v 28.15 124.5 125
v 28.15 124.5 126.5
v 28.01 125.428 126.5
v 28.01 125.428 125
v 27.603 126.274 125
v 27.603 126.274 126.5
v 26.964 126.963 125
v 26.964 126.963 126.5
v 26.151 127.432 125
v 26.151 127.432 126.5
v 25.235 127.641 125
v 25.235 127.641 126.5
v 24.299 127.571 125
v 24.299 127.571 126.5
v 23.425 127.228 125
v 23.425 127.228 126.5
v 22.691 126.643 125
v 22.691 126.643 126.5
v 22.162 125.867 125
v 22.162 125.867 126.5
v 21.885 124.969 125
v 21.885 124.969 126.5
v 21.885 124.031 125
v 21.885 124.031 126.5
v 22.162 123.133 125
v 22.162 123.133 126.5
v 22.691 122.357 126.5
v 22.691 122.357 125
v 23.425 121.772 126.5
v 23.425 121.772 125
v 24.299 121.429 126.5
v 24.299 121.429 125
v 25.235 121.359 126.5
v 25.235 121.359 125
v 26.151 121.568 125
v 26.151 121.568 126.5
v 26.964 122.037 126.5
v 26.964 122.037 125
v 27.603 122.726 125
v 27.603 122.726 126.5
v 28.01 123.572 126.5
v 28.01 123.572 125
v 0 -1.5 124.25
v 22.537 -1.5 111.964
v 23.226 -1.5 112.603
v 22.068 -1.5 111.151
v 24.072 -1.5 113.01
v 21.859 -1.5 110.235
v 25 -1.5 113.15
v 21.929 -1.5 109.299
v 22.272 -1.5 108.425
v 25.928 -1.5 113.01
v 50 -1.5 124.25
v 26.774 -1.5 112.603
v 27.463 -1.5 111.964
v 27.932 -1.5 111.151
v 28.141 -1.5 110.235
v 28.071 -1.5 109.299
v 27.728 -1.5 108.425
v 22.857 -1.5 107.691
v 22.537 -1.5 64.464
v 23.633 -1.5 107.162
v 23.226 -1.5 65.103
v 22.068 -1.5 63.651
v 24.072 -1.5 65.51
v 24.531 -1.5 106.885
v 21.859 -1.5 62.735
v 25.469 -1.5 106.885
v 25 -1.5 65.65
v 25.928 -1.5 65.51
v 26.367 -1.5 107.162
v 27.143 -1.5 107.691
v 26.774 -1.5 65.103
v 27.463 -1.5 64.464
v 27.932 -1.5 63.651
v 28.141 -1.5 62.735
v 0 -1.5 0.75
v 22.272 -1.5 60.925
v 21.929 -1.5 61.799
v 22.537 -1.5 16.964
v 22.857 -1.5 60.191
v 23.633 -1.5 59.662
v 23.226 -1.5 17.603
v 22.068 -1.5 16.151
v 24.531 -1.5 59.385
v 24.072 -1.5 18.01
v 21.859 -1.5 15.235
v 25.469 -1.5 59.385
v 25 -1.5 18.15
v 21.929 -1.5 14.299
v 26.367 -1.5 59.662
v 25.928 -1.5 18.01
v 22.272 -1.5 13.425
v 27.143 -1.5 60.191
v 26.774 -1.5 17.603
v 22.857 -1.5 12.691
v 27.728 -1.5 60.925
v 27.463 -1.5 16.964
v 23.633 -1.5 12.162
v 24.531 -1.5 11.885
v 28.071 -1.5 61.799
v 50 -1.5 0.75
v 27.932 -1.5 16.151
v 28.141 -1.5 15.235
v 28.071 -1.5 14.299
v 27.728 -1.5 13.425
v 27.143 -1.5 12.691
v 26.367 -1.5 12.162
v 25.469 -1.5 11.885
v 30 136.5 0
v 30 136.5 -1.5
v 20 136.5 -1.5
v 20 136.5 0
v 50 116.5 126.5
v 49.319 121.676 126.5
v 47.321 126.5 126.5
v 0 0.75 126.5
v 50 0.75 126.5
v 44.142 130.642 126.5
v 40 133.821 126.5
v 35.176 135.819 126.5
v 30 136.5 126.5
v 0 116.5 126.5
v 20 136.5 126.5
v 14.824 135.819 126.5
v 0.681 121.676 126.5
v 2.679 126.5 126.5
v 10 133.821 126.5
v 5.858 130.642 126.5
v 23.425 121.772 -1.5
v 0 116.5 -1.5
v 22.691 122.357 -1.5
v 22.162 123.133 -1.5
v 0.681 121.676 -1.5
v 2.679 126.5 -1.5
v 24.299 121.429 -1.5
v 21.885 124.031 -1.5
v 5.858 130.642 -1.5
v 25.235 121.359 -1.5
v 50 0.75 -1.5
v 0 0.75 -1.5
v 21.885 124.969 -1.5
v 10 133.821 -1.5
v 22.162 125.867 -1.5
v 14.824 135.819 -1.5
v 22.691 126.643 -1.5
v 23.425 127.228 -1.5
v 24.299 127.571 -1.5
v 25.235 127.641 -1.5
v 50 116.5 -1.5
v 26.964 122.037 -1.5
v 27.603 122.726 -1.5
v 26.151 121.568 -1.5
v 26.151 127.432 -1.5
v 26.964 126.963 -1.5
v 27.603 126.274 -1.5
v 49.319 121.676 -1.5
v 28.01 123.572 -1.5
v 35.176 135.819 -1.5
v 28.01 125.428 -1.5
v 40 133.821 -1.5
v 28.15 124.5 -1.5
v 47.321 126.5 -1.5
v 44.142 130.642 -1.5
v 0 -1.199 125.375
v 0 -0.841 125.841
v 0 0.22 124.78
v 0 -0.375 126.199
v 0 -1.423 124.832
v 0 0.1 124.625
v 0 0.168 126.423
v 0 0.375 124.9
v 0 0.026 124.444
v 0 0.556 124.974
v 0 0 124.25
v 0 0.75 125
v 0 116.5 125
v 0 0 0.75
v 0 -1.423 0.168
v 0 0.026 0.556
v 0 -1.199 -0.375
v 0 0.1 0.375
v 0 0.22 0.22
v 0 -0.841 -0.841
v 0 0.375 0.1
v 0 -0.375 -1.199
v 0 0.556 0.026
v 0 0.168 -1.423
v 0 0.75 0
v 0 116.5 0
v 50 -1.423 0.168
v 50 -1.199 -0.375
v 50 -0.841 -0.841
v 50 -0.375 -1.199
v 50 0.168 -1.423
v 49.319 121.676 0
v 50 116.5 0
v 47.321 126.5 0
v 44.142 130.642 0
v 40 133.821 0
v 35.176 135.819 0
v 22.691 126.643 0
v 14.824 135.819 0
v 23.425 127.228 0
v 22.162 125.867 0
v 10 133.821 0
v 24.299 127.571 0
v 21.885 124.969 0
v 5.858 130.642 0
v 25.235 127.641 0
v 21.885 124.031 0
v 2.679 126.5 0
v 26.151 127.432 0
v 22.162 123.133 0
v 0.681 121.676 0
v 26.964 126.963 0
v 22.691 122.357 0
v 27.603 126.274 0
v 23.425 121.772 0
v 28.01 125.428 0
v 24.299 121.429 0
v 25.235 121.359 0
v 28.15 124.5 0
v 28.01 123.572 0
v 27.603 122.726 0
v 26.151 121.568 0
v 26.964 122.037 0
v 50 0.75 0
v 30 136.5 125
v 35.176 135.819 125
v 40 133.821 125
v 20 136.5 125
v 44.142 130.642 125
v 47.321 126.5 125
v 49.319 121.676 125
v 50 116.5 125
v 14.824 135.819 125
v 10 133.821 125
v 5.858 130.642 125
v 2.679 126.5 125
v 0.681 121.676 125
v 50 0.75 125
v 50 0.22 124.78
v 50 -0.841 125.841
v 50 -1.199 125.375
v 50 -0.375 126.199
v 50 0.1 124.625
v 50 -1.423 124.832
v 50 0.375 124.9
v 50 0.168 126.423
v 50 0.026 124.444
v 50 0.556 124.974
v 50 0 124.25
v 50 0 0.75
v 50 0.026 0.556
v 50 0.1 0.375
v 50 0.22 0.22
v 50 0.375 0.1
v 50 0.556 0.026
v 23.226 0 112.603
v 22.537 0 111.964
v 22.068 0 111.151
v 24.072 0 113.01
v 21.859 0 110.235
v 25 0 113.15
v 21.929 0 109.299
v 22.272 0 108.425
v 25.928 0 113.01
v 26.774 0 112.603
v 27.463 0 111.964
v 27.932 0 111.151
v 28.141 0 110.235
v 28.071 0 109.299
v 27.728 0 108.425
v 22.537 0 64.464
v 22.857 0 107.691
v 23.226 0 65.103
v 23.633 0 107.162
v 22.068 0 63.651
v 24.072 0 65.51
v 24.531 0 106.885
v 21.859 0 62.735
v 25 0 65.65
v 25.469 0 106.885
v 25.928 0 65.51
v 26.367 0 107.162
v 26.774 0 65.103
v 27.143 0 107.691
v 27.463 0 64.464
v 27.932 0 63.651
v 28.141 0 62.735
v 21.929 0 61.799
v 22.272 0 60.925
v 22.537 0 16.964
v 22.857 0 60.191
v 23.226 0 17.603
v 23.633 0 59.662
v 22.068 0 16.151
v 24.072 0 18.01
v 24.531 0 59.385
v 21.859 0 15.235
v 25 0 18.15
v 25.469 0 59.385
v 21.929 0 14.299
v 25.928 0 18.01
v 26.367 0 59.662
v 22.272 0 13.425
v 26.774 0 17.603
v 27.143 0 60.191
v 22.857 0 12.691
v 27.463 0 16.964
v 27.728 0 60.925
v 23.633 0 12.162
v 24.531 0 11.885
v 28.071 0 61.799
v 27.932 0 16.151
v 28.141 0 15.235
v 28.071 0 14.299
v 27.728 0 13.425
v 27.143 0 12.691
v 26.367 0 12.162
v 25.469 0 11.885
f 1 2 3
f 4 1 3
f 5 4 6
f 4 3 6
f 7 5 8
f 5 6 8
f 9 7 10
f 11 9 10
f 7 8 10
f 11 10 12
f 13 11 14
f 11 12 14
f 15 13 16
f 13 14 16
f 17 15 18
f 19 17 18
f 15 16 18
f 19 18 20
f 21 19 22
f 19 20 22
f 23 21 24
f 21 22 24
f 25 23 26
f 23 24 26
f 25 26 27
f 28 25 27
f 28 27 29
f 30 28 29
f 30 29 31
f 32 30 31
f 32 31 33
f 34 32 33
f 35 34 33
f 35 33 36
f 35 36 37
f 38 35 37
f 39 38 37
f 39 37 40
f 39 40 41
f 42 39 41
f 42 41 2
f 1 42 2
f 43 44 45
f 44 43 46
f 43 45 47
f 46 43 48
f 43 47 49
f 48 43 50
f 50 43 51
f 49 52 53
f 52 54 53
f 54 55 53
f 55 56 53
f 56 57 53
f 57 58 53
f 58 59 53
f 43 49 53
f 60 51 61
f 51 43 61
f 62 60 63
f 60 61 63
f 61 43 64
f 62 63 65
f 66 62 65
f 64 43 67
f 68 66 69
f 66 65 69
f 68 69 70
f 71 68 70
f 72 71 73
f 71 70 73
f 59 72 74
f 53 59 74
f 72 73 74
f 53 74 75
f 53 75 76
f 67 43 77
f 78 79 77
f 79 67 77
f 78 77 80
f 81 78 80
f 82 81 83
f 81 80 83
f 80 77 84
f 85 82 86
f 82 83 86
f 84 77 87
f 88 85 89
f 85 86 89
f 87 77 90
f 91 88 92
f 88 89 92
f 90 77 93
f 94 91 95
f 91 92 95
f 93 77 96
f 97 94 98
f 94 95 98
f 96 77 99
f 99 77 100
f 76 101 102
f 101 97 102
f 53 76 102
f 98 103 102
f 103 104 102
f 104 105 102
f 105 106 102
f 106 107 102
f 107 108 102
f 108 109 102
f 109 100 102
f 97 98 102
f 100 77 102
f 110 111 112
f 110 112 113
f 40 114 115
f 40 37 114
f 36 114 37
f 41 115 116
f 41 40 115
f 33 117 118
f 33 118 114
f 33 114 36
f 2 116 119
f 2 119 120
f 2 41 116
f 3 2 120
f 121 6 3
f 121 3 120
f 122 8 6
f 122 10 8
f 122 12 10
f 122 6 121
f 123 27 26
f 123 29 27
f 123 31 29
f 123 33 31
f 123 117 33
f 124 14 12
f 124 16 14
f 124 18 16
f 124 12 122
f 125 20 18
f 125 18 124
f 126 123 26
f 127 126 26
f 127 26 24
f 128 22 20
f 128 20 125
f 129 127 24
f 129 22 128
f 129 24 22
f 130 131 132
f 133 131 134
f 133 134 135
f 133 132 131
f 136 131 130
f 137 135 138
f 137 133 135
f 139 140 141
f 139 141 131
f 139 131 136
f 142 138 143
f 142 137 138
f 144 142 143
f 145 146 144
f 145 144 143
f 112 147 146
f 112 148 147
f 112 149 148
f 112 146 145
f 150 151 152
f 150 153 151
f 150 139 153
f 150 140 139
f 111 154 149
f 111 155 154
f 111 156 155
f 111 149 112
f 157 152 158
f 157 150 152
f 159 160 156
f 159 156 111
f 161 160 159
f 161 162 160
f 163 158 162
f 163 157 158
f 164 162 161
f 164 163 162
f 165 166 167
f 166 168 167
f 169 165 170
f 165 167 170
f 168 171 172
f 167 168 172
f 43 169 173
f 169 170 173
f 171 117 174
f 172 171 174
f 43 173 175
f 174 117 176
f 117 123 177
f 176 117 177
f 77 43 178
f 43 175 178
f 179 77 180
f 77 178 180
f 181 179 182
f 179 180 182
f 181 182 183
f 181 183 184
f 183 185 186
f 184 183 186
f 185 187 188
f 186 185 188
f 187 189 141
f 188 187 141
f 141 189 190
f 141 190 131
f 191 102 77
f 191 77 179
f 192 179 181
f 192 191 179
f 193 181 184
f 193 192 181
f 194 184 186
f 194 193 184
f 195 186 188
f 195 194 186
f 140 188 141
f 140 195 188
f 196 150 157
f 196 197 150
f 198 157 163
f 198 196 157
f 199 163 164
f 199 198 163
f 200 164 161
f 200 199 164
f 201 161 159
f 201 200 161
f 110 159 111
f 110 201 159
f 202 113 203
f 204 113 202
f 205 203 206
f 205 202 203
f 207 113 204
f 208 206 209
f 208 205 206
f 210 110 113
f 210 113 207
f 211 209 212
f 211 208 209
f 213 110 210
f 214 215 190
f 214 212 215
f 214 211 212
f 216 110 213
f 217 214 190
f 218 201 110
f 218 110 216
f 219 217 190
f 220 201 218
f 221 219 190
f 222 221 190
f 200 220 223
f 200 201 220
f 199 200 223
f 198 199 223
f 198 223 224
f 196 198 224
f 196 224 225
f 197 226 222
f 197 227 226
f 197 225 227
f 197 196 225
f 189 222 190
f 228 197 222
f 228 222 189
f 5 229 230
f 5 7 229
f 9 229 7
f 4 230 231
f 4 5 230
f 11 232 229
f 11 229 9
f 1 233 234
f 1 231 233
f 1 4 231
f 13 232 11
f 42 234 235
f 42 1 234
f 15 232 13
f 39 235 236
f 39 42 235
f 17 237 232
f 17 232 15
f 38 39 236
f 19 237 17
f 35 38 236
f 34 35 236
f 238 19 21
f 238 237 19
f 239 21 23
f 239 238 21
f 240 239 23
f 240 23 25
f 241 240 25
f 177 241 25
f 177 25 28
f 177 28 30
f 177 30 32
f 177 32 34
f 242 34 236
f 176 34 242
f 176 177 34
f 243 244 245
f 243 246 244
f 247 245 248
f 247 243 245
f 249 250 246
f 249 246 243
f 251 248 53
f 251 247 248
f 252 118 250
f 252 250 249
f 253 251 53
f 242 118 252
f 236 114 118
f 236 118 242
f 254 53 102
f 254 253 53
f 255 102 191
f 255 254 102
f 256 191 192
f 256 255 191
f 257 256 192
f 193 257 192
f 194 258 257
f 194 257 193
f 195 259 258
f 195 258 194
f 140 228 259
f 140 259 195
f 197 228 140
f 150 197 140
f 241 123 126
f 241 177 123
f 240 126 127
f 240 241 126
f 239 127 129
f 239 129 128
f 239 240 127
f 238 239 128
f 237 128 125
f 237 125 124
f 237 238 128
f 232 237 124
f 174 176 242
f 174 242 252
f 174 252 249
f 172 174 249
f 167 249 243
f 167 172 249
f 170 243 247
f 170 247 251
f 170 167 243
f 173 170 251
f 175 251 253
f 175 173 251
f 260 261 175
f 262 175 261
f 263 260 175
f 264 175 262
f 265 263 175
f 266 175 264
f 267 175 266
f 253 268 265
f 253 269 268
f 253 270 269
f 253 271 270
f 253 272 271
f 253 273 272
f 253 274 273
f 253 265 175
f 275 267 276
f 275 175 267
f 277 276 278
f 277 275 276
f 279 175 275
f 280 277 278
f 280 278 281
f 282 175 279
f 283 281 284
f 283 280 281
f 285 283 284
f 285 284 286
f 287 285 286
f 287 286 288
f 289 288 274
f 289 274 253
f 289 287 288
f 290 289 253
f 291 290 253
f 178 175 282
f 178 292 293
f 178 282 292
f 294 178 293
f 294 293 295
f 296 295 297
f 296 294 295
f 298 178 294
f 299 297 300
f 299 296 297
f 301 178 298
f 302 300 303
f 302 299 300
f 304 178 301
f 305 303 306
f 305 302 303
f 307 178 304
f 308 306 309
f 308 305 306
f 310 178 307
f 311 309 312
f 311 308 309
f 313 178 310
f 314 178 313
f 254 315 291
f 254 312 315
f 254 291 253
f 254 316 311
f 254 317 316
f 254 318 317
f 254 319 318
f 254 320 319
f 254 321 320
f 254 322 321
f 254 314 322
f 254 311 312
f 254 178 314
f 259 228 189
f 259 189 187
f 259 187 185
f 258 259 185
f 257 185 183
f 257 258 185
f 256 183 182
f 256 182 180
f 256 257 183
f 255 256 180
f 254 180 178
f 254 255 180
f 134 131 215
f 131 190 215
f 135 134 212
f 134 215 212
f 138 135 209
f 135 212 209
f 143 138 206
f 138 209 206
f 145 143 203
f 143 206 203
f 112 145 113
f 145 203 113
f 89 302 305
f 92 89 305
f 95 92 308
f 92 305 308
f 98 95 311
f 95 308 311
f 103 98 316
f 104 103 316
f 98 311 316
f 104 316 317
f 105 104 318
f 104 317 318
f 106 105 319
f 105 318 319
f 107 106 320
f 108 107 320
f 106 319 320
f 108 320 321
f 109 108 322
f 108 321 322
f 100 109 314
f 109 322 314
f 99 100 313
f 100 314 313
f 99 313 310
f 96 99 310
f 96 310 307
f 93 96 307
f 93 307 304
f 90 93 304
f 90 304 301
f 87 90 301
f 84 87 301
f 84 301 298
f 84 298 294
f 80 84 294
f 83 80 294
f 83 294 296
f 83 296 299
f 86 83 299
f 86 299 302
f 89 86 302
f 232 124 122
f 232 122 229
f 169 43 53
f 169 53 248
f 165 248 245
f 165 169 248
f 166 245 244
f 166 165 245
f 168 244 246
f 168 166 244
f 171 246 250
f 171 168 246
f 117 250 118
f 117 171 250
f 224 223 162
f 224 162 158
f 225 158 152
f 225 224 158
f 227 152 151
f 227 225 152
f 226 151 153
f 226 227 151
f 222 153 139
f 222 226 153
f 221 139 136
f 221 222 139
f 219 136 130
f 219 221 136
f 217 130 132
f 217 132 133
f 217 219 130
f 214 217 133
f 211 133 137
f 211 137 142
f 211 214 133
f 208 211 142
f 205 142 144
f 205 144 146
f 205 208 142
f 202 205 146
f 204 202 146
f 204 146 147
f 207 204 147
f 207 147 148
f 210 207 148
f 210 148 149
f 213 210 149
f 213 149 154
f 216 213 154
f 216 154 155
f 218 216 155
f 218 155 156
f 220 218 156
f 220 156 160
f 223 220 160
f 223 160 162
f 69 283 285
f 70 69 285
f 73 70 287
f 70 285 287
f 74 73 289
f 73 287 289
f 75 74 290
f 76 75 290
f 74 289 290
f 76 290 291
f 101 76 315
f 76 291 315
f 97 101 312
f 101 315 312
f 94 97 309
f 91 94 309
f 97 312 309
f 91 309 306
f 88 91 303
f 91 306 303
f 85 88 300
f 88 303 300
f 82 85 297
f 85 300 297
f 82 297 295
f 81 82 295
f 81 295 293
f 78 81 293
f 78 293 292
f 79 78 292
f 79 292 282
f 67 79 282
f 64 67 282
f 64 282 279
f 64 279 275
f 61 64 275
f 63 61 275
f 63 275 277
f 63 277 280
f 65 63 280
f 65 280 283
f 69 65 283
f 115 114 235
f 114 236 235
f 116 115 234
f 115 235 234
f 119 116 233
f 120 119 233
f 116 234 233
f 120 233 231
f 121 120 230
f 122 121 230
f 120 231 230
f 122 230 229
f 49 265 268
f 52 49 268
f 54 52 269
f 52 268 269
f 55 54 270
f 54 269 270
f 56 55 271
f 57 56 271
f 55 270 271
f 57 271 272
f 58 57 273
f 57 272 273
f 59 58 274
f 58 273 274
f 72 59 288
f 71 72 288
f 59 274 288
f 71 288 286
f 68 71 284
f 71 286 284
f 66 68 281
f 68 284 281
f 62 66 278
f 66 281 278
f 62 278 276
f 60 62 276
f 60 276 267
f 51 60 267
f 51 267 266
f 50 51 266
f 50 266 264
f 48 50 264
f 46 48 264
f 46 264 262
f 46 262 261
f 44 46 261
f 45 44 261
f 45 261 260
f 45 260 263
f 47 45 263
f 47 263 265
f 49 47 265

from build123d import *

# Parameters (mm, degrees)
SKETCH1_W                    = 50
SKETCH1_H                    = 125
BASE_FLANGE1_DEPTH           = 1.5
EDGE_FLANGE1_STRIP_W         = 7.5
EDGE_FLANGE1_STRIP_H         = 1.5
EDGE_FLANGE1_STRIP_CUT_DEPTH = 50
EDGE_FLANGE1_DEPTH           = 50
SKETCH9_R                    = 3.15
CUT_EXTRUDE1_DEPTH           = 176
EDGE_FLANGE2_STRIP_W         = 7.5
EDGE_FLANGE2_STRIP_H         = 1.5
EDGE_FLANGE2_STRIP_CUT_DEPTH = 50
EDGE_FLANGE2_DEPTH           = 50
CUT_EXTRUDE2_START           = -10
SKETCH13_R                   = 3.15
CUT_EXTRUDE2_DEPTH           = 10
FILLET1_R                    = 20
SKETCH14_R                   = 3.15
CUT_EXTRUDE3_DEPTH           = 10


# Sheet-metal steps are written as plain solids
with BuildPart() as part:
    # Sketch1 → Base-Flange1 (new body)
    with BuildSketch(Plane(origin=(0, 0, 0), x_dir=(1, 0, 0), z_dir=(0, 1, 0))):
        with Locations((25, -62.5)):
            Rectangle(SKETCH1_W, SKETCH1_H)
    extrude(amount=-BASE_FLANGE1_DEPTH)

    # Edge-Flange1 strip (across the edge) → Edge-Flange1 strip cut (cut)
    with BuildSketch(Plane(origin=(0, 0, 125), x_dir=(0, 0, -1), z_dir=(1, 0, 0))):
        with Locations((-3, -0.75)):
            Rectangle(EDGE_FLANGE1_STRIP_W, EDGE_FLANGE1_STRIP_H)
    extrude(amount=EDGE_FLANGE1_STRIP_CUT_DEPTH, mode=Mode.SUBTRACT)

    # Edge-Flange1 section (across the edge) → Edge-Flange1 (add)
    with BuildSketch(Plane(origin=(0, 0, 125), x_dir=(0, 0, -1), z_dir=(1, 0, 0))):
        with BuildLine():
            Line((-1.5, 0.75), (-1.5, 136.5))
            Line((-1.5, 136.5), (0, 136.5))
            Line((0, 136.5), (0, 0.75))
            ThreePointArc((0, 0.75), (0.219669914, 0.219669914), (0.75, 0))
            Line((0.75, 0), (0.75, -1.5))
            ThreePointArc((0.75, -1.5), (-0.840990258, -0.840990258), (-1.5, 0.75))
        make_face()
    extrude(amount=EDGE_FLANGE1_DEPTH)

    # Sketch9 → Cut-Extrude1 (cut)
    with BuildSketch(Plane.XY.offset(126.5)):
        with Locations((25, 124.5)):
            Circle(SKETCH9_R)
    extrude(amount=-CUT_EXTRUDE1_DEPTH, mode=Mode.SUBTRACT)

    # Edge-Flange2 strip (across the edge) → Edge-Flange2 strip cut (cut)
    with BuildSketch(Plane.ZY.offset(-50)):
        with Locations((-3, -0.75)):
            Rectangle(EDGE_FLANGE2_STRIP_W, EDGE_FLANGE2_STRIP_H)
    extrude(amount=EDGE_FLANGE2_STRIP_CUT_DEPTH, mode=Mode.SUBTRACT)

    # Edge-Flange2 section (across the edge) → Edge-Flange2 (add)
    with BuildSketch(Plane.ZY.offset(-50)):
        with BuildLine():
            Line((-1.5, 0.75), (-1.5, 136.5))
            Line((-1.5, 136.5), (0, 136.5))
            Line((0, 136.5), (0, 0.75))
            ThreePointArc((0, 0.75), (0.219669914, 0.219669914), (0.75, 0))
            Line((0.75, 0), (0.75, -1.5))
            ThreePointArc((0.75, -1.5), (-0.840990258, -0.840990258), (-1.5, 0.75))
        make_face()
    extrude(amount=EDGE_FLANGE2_DEPTH)

    # Sketch13 → Cut-Extrude2 (cut)
    with BuildSketch(Plane(origin=(0, 0, -1.5), x_dir=(-1, 0, 0), z_dir=(0, 0, -1)).offset(CUT_EXTRUDE2_START)):
        with Locations(Location((-25, 124.5, 0), (0, 0, 180))):
            Circle(SKETCH13_R)
    extrude(amount=CUT_EXTRUDE2_DEPTH, mode=Mode.SUBTRACT)

    # Fillet1
    fillet1_edges = [part.edges().sort_by_distance(p)[0] for p in [
        (0, 136.5, 125.75),
        (50, 136.5, 125.75),
        (50, 136.5, -0.75),
        (0, 136.5, -0.75),
    ]]
    fillet(fillet1_edges, radius=FILLET1_R)

    # Sketch14 → Cut-Extrude3 (cut)
    with BuildSketch(Plane(origin=(0, 0, 0), x_dir=(1, 0, 0), z_dir=(0, 1, 0))):
        with Locations(Location((25, -15, 0), (0, 0, 270))):
            Circle(SKETCH14_R)
        with Locations(Location((25, -62.5, 0), (0, 0, 270))):
            Circle(SKETCH14_R)
        with Locations(Location((25, -110, 0), (0, 0, 270))):
            Circle(SKETCH14_R)
    extrude(amount=-CUT_EXTRUDE3_DEPTH, mode=Mode.SUBTRACT)


solid = part.part
